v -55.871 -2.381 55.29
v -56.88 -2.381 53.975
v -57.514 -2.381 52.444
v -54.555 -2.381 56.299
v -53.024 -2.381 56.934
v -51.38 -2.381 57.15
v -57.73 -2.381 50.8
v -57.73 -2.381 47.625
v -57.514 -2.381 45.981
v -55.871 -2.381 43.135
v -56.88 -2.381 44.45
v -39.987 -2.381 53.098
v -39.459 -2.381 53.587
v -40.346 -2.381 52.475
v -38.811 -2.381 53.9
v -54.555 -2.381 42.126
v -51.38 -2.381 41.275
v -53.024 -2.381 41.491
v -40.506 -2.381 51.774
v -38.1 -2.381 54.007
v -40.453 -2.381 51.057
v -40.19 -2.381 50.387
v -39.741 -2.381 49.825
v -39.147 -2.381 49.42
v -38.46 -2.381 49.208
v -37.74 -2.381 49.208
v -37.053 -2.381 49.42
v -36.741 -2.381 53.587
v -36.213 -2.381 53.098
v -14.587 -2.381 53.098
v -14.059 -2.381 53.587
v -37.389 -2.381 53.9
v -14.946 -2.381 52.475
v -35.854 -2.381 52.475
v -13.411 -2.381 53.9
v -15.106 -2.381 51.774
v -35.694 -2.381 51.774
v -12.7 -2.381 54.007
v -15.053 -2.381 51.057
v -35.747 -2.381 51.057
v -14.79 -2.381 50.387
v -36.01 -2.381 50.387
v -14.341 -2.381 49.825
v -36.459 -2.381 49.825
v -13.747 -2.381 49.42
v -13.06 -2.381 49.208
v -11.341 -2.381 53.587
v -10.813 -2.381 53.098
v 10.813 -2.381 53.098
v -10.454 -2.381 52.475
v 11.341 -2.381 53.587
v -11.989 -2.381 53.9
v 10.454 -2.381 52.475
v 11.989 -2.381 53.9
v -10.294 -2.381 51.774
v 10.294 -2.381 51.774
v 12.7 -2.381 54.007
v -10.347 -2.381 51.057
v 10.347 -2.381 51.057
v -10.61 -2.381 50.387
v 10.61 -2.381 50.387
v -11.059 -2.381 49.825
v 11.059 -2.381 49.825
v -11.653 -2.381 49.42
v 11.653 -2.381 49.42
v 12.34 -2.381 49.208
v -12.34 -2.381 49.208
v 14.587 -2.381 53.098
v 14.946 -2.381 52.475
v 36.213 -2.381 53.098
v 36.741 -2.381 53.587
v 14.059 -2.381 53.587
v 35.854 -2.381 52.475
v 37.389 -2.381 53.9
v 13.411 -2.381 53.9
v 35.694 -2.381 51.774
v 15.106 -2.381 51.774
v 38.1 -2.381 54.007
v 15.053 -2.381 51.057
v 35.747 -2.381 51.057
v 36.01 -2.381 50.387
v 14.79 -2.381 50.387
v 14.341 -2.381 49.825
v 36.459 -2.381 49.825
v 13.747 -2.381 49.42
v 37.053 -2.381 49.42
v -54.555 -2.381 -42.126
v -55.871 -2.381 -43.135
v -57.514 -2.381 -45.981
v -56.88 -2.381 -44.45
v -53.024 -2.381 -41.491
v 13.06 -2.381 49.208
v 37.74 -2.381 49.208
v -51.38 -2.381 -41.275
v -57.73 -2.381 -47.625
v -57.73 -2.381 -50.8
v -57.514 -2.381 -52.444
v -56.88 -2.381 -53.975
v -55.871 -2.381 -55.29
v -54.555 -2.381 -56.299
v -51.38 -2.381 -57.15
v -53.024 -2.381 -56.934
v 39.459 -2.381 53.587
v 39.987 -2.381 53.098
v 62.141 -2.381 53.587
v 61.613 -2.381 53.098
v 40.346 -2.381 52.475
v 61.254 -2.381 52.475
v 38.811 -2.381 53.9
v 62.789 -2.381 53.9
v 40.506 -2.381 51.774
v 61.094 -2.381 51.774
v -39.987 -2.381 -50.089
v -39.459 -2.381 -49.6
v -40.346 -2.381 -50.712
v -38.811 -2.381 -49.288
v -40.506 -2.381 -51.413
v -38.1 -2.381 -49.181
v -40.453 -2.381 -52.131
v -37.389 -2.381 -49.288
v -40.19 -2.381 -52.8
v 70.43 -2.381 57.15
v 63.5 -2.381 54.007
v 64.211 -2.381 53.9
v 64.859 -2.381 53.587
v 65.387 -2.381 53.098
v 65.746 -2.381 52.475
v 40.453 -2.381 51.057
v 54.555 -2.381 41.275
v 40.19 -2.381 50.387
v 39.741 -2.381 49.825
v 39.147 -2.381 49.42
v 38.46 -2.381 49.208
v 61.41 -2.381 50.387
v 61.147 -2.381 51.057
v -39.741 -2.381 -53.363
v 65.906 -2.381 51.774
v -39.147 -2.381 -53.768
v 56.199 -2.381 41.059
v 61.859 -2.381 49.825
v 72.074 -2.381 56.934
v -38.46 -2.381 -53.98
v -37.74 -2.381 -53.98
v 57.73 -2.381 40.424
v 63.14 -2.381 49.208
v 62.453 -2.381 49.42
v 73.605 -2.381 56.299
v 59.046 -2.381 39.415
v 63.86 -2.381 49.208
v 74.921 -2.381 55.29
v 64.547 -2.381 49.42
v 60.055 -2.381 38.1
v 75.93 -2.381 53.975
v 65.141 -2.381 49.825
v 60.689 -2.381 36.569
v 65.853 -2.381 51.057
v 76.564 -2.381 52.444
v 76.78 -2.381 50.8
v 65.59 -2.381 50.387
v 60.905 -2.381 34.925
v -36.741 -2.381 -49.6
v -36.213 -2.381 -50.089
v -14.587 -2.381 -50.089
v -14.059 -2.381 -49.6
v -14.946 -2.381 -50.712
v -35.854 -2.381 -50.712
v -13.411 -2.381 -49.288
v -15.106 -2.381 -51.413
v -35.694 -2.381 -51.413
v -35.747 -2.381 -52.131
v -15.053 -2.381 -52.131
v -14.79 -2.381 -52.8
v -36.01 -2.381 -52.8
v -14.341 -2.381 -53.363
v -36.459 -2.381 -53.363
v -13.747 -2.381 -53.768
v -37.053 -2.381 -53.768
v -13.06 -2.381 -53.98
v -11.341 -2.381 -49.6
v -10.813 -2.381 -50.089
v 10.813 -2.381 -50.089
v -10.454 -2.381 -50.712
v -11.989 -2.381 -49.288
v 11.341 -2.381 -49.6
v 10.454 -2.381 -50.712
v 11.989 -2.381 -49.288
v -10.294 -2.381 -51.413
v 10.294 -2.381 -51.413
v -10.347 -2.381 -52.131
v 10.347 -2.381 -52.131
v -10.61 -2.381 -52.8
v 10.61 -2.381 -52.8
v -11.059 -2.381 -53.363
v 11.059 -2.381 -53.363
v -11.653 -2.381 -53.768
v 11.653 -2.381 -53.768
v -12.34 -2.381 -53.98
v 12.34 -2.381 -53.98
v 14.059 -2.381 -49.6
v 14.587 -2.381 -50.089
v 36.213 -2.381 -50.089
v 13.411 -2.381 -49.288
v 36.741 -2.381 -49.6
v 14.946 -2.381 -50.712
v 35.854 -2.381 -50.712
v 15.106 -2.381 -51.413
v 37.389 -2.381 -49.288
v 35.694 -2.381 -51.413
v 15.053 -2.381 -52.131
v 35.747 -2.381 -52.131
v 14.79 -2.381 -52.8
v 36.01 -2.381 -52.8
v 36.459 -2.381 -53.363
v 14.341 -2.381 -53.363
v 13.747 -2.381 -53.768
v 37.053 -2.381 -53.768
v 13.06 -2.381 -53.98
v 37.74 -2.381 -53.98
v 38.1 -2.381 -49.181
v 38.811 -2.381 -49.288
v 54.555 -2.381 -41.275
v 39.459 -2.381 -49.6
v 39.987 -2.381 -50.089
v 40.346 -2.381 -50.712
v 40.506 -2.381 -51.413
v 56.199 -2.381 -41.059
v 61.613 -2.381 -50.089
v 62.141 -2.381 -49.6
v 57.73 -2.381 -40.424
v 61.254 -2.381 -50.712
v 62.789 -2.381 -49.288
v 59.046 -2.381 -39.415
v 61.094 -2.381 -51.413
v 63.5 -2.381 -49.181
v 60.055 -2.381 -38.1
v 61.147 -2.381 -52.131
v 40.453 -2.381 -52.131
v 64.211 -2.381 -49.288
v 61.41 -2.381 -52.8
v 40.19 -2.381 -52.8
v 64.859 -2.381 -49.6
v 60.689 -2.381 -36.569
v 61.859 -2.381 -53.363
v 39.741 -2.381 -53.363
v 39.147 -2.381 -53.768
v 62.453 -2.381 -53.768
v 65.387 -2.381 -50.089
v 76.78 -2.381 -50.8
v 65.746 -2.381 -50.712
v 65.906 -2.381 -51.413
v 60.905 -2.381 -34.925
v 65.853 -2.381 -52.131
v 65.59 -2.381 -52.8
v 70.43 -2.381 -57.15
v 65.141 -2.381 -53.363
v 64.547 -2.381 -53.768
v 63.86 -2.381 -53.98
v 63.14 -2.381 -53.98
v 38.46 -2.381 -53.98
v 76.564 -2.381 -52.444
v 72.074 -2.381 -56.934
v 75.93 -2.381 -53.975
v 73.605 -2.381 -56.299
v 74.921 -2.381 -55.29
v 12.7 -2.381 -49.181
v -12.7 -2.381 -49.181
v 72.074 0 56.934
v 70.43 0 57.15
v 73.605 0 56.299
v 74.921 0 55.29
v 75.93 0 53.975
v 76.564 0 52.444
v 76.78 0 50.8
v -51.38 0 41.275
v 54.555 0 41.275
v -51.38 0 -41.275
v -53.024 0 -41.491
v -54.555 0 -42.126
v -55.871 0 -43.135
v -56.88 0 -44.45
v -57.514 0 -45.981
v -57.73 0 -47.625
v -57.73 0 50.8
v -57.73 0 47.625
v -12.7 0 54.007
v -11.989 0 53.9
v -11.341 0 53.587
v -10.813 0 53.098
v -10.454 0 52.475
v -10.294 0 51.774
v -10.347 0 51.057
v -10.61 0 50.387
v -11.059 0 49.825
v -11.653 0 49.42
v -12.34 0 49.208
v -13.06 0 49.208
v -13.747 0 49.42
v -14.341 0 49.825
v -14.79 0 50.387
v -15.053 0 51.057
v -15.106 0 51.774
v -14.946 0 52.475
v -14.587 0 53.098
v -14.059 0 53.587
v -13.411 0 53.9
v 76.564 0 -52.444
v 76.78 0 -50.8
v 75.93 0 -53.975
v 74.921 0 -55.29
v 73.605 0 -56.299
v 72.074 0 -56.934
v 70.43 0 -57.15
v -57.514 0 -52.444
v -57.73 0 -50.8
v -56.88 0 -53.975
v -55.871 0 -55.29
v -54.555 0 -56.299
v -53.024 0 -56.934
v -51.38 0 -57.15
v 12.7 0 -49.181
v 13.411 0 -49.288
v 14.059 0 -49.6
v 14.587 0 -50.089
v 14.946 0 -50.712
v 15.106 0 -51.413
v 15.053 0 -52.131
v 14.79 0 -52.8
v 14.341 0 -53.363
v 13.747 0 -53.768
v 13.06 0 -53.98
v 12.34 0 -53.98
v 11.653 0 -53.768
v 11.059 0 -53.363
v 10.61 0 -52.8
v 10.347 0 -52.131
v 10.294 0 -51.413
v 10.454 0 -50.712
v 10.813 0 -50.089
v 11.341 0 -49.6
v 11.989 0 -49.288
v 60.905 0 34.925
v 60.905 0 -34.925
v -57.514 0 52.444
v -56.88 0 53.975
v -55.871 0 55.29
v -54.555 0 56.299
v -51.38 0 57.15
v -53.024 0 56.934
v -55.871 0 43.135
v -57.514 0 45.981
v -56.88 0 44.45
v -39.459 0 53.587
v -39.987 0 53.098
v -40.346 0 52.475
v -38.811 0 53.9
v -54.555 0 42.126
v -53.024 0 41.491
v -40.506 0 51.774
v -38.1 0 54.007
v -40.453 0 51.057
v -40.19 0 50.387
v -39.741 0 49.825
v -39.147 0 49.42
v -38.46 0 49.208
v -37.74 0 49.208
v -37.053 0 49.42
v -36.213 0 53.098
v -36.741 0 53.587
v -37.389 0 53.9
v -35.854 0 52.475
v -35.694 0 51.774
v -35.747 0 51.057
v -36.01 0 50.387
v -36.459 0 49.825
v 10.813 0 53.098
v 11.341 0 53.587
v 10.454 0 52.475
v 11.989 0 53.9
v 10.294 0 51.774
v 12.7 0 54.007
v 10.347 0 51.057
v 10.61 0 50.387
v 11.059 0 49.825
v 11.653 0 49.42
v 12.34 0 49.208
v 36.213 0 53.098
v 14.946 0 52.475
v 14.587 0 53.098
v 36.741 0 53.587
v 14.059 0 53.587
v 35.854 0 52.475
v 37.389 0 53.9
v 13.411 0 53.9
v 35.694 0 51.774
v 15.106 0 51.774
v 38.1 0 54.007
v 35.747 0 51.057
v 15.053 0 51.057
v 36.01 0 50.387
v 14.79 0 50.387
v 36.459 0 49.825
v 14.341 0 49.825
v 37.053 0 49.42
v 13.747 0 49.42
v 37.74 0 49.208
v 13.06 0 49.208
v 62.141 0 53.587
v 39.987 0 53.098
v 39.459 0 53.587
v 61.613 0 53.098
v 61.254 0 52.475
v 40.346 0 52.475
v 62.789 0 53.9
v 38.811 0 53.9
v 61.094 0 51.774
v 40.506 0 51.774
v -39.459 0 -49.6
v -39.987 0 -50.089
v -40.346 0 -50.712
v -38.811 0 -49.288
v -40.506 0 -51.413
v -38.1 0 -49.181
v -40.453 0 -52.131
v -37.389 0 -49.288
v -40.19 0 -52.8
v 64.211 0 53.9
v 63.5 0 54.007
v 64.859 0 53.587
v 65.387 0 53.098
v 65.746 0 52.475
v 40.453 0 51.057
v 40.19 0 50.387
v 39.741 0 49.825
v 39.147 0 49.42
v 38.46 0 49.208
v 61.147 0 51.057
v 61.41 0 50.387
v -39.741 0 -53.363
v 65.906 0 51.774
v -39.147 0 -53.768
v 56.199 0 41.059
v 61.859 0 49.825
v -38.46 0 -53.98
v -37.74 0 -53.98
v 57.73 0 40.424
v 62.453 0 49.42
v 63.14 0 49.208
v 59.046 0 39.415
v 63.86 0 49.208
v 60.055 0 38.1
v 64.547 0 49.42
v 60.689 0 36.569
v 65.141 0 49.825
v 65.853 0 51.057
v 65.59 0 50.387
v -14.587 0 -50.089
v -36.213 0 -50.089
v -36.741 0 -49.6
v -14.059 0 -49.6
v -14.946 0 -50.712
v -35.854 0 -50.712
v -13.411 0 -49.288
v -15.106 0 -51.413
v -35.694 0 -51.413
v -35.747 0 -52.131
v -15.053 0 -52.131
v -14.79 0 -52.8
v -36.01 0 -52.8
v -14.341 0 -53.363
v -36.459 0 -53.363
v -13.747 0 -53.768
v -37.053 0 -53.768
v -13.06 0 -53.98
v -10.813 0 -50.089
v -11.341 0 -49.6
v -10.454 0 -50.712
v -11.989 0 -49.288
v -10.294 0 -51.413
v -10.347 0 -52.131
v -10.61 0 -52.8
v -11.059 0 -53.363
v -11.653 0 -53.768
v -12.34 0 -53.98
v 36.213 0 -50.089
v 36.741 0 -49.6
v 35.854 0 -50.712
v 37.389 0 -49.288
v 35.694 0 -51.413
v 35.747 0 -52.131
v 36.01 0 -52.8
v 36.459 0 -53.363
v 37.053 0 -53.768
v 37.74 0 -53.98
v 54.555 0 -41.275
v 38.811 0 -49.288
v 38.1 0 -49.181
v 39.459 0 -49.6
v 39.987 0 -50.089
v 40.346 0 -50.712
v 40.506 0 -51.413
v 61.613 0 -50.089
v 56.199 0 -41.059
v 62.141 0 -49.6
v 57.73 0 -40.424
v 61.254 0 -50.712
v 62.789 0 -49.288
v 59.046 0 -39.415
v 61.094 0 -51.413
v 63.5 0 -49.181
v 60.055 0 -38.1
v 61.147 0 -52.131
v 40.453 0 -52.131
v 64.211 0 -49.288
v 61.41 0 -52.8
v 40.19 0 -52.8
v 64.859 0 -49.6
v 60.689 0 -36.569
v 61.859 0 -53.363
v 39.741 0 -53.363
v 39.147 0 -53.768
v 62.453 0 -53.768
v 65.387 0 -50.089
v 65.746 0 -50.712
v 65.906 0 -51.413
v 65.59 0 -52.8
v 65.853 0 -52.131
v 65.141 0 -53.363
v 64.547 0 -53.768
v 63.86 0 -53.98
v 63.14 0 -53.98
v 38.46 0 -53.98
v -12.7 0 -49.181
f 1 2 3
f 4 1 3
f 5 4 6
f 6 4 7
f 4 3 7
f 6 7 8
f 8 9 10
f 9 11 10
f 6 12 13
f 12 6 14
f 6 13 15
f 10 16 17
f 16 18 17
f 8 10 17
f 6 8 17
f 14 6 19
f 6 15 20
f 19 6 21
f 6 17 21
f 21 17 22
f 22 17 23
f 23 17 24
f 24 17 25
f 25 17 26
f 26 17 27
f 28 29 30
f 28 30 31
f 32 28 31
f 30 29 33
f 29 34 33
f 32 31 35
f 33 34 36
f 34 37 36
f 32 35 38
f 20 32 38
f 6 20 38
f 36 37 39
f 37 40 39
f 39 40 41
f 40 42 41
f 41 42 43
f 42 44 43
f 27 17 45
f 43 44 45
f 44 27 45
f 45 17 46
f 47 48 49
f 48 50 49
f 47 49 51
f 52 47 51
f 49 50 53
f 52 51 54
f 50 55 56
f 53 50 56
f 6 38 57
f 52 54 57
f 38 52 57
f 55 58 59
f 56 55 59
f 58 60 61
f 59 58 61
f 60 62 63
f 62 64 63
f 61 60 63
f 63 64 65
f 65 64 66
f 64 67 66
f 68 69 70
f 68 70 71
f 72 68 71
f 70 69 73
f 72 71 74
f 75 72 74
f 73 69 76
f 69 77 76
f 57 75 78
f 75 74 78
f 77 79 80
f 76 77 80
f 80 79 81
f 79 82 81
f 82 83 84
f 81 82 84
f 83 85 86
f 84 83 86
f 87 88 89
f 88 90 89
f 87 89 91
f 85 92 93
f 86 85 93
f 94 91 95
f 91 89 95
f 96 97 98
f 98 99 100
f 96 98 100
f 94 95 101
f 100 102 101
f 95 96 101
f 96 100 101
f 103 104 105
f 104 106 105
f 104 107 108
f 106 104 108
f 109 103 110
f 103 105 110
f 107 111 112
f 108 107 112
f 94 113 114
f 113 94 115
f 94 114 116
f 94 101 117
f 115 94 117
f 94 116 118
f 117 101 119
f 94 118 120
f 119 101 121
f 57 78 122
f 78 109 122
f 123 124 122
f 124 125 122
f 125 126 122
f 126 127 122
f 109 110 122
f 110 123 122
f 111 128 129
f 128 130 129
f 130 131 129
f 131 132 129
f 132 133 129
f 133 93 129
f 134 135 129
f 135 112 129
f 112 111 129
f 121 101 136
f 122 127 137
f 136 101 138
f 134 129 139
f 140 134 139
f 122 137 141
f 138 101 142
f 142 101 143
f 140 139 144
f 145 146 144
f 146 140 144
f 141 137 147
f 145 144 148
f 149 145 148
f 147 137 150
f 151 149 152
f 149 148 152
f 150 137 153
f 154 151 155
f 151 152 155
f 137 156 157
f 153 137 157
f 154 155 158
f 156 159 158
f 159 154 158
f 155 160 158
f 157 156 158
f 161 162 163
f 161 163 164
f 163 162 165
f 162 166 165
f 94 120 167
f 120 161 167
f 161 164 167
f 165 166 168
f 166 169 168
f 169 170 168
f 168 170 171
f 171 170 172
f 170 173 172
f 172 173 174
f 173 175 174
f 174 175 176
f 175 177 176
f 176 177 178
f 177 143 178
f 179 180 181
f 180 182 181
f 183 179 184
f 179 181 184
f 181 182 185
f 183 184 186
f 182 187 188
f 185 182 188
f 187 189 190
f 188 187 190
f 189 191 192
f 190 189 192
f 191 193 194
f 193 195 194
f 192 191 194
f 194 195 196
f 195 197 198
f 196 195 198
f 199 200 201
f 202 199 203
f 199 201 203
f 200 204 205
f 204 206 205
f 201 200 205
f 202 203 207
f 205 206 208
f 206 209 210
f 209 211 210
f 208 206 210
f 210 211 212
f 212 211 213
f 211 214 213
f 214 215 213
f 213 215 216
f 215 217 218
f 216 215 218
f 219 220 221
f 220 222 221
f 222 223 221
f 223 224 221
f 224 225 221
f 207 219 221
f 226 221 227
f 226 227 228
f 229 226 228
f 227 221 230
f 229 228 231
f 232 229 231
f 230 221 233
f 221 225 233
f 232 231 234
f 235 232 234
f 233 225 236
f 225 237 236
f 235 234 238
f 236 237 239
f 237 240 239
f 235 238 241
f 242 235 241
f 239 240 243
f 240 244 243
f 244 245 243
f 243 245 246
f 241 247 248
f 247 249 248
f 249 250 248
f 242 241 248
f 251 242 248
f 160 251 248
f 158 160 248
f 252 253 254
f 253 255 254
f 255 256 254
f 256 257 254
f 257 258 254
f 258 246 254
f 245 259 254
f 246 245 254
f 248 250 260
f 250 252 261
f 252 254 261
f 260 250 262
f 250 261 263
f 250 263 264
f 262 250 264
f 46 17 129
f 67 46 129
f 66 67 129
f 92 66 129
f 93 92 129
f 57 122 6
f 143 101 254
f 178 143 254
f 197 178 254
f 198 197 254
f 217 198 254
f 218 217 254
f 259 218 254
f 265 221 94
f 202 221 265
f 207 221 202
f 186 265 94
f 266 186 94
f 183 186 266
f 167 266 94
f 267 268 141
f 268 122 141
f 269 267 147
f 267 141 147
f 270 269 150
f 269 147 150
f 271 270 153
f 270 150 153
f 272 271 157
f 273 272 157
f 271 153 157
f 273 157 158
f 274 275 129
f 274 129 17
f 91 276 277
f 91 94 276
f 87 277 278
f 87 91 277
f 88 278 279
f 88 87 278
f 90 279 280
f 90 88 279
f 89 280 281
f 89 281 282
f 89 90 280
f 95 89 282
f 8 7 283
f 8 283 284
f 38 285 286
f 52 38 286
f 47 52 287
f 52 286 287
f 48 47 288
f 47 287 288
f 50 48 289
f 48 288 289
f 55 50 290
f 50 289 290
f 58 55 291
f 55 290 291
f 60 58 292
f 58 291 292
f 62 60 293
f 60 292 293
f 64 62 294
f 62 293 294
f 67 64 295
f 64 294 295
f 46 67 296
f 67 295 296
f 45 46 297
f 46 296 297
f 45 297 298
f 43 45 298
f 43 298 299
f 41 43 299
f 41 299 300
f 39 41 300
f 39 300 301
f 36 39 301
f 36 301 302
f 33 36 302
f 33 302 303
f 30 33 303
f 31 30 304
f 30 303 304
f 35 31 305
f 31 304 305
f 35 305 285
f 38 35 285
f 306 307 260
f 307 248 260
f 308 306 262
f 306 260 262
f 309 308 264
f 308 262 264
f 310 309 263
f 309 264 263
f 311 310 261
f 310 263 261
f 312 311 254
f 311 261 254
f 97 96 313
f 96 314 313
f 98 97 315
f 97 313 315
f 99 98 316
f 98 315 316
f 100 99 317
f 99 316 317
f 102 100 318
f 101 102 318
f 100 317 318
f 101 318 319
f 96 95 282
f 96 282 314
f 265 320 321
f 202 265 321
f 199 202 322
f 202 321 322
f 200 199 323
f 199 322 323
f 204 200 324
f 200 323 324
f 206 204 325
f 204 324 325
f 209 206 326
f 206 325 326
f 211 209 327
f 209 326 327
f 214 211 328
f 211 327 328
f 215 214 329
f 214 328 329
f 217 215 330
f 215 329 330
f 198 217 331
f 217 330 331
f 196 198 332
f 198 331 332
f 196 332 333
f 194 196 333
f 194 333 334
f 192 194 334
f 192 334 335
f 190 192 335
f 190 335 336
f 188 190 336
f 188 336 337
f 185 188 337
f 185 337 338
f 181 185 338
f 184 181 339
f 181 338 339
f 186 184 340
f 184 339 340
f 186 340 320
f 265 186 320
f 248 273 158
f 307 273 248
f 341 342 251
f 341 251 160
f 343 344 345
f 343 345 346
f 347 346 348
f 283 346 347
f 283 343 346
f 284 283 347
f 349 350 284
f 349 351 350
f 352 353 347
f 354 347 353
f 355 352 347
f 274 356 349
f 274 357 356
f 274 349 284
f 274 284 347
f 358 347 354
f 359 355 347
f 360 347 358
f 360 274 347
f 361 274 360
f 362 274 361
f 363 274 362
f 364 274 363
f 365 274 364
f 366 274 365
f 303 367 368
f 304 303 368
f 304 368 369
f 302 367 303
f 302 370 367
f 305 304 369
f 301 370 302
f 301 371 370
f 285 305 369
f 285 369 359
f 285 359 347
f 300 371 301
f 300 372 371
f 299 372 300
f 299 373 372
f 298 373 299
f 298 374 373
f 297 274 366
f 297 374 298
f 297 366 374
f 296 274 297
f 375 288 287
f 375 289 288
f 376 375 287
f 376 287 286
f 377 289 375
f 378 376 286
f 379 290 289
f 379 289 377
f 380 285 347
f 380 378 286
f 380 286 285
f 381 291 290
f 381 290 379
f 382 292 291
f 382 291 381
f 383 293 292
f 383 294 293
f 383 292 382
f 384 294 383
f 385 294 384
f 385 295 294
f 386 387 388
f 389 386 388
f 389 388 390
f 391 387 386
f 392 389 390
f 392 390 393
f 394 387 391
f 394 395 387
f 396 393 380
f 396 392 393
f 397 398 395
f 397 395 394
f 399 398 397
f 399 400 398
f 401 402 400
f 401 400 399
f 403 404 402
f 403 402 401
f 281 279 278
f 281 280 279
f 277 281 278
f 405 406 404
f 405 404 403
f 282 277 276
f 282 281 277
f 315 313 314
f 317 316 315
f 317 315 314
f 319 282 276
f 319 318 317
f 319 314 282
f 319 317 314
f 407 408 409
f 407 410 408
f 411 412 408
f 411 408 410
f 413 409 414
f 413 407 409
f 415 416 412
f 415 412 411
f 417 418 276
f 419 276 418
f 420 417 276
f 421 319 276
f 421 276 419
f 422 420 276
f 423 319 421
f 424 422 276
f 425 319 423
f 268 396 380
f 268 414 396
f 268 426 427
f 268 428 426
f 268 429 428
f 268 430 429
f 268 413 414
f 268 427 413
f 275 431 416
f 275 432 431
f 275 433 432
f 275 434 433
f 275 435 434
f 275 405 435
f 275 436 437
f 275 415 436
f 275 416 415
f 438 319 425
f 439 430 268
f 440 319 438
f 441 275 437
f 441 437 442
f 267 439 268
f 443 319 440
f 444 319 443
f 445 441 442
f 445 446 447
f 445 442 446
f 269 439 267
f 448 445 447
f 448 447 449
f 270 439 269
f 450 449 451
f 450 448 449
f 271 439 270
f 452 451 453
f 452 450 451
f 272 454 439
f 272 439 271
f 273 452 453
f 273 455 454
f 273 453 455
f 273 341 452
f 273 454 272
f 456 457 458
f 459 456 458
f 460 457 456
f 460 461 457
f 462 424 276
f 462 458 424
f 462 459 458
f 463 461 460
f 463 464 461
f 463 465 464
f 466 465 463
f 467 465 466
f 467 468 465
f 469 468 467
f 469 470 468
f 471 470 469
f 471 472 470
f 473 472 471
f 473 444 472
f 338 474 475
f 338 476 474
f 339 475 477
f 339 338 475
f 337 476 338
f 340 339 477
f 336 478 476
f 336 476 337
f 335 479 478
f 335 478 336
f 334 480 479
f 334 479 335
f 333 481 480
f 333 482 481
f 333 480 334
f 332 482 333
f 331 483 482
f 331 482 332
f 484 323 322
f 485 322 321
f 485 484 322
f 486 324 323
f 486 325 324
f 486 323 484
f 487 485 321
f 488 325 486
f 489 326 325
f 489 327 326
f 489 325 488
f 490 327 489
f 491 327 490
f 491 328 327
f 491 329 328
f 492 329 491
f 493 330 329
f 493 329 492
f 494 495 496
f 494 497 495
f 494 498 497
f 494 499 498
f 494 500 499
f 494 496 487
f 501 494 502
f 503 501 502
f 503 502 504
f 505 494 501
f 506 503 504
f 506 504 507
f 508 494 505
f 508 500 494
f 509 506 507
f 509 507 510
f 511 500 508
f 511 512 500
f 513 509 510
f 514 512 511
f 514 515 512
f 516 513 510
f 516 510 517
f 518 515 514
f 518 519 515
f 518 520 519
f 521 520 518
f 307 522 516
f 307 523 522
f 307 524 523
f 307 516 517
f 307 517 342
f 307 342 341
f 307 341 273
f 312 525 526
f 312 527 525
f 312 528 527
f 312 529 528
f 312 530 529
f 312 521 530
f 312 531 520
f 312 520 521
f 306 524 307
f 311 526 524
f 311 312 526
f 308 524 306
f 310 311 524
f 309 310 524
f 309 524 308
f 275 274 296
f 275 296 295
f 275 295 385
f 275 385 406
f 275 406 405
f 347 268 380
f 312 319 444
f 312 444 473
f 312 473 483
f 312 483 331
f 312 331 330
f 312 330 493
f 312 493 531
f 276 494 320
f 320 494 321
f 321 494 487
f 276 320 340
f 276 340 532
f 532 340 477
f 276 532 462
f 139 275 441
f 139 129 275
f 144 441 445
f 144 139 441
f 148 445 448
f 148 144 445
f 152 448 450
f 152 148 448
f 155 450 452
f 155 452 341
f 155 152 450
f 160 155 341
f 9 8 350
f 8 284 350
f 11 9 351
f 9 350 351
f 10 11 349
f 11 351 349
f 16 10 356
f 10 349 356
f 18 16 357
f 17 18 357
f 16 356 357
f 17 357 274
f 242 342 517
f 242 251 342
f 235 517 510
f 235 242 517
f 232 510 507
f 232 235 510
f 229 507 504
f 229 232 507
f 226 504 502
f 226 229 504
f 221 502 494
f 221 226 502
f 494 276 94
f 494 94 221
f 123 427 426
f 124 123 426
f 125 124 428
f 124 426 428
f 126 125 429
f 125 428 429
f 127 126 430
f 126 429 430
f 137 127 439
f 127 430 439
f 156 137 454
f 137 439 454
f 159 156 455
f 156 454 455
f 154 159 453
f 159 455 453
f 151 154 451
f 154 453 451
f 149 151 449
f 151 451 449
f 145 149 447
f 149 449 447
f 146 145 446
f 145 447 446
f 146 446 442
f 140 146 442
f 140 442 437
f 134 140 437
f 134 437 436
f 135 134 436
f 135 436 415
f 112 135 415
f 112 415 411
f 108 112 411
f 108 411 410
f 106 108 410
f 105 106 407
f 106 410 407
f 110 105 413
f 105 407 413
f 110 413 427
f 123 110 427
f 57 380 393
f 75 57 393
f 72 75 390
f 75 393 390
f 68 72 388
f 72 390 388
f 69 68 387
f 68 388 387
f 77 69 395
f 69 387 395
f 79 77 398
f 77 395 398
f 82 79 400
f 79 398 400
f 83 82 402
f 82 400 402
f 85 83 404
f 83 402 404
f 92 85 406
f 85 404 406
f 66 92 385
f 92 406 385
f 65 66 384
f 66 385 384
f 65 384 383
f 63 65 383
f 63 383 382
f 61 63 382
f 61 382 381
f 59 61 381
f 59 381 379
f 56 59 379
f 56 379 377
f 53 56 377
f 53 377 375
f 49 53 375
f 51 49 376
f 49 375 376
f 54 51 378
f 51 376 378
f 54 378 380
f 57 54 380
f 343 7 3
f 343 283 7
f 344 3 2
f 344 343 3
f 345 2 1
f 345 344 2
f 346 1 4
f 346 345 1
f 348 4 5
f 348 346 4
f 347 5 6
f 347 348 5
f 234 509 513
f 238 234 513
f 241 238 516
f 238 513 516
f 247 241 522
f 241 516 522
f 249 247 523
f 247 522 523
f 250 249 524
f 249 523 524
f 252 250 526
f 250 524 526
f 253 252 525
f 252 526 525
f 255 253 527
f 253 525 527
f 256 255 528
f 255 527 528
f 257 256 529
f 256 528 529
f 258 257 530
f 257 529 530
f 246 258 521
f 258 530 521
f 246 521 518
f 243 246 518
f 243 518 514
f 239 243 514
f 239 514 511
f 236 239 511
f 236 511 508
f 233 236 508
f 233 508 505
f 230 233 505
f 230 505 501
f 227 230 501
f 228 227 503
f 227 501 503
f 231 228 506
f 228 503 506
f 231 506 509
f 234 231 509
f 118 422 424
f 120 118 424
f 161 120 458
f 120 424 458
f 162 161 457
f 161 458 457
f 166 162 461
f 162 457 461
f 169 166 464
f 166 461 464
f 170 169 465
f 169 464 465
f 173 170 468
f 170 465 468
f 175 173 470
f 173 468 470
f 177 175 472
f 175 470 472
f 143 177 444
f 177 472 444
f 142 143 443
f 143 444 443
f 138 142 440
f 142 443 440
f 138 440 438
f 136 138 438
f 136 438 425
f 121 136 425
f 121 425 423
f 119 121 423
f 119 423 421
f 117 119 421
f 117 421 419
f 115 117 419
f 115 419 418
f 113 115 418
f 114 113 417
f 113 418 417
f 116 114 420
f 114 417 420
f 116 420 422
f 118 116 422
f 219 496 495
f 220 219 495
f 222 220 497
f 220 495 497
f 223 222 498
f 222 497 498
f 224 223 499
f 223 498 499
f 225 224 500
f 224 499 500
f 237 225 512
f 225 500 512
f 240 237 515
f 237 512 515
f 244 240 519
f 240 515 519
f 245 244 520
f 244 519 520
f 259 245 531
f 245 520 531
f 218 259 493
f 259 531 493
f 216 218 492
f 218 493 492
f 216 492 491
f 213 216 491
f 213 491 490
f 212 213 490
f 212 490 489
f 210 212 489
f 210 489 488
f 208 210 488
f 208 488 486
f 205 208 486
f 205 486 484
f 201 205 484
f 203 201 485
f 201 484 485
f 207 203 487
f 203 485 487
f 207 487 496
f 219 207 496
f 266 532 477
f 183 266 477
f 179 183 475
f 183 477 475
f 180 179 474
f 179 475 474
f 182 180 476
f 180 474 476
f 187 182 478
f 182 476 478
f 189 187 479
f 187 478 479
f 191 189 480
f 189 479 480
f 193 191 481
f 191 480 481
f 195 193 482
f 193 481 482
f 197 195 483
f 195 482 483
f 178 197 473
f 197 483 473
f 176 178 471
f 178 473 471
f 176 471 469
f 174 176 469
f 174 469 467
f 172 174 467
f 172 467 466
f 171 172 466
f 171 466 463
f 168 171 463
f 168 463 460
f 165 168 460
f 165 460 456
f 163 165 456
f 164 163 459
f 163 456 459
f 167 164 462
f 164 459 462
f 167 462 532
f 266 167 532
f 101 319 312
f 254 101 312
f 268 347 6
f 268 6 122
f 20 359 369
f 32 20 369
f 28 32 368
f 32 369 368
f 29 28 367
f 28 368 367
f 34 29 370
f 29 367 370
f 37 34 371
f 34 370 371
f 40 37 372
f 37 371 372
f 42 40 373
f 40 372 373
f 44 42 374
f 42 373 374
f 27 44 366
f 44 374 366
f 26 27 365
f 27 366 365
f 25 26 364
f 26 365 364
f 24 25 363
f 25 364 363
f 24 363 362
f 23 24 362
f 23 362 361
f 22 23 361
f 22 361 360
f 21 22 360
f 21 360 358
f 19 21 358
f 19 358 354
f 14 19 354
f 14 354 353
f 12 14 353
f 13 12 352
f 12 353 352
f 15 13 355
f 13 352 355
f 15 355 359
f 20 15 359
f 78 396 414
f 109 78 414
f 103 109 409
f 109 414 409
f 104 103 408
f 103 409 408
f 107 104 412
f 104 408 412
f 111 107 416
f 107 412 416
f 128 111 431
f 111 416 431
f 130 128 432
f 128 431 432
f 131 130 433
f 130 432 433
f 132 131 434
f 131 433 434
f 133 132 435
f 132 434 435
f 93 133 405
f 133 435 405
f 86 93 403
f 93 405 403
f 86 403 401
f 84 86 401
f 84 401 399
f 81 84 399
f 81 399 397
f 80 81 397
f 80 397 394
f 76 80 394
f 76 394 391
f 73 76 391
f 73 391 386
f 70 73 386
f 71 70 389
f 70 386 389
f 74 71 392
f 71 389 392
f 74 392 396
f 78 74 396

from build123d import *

# Parameters (mm, degrees)
SKETCH1_W          = 153.56078
SKETCH1_H          = 114.3
SKETCH1_R          = 2.413
BASE_FLANGE1_DEPTH = 2.38125
FILLET1_R          = 6.35
SKETCH7_W          = 19.05
SKETCH7_H          = 114.3
CUT_EXTRUDE2_DEPTH = 2.54
FILLET2_R          = 6.35
FILLET3_R          = 6.35


# Sheet-metal steps are written as plain solids
with BuildPart() as part:
    # Sketch1 → Base-Flange1 (new body)
    with BuildSketch(Plane(origin=(0, 0, 0), x_dir=(1, 0, 0), z_dir=(0, 1, 0))):
        Rectangle(SKETCH1_W, SKETCH1_H)
        with Locations(Location((-63.5, -51.59375, 0), (0, 0, 270))):
            Circle(SKETCH1_R, mode=Mode.SUBTRACT)
        with Locations(Location((-38.1, -51.59375, 0), (0, 0, 270))):
            Circle(SKETCH1_R, mode=Mode.SUBTRACT)
        with Locations(Location((-12.7, -51.59375, 0), (0, 0, 270))):
            Circle(SKETCH1_R, mode=Mode.SUBTRACT)
        with Locations(Location((12.7, -51.59375, 0), (0, 0, 270))):
            Circle(SKETCH1_R, mode=Mode.SUBTRACT)
        with Locations(Location((38.1, -51.59375, 0), (0, 0, 270))):
            Circle(SKETCH1_R, mode=Mode.SUBTRACT)
        with Locations(Location((63.5, -51.59375, 0), (0, 0, 270))):
            Circle(SKETCH1_R, mode=Mode.SUBTRACT)
        with Locations(Location((63.5, 51.59375, 0), (0, 0, 270))):
            Circle(SKETCH1_R, mode=Mode.SUBTRACT)
        with Locations(Location((38.1, 51.59375, 0), (0, 0, 270))):
            Circle(SKETCH1_R, mode=Mode.SUBTRACT)
        with Locations(Location((12.7, 51.59375, 0), (0, 0, 270))):
            Circle(SKETCH1_R, mode=Mode.SUBTRACT)
        with Locations(Location((-12.7, 51.59375, 0), (0, 0, 270))):
            Circle(SKETCH1_R, mode=Mode.SUBTRACT)
        with Locations(Location((-38.1, 51.59375, 0), (0, 0, 270))):
            Circle(SKETCH1_R, mode=Mode.SUBTRACT)
        with Locations(Location((-63.5, 51.59375, 0), (0, 0, 270))):
            Circle(SKETCH1_R, mode=Mode.SUBTRACT)
        Polygon((60.90539, -41.275), (-63.104482091, -41.275), (-63.104482091, 41.275), (21.327886111, 41.275), (60.90539, 41.275), (60.90539, 15.875), align=None, mode=Mode.SUBTRACT)
    extrude(amount=-BASE_FLANGE1_DEPTH)

    # Fillet1
    fillet1_edges = [part.edges().sort_by_distance(p)[0] for p in [
        (-76.78039, -1.190625, -57.15),
        (76.78039, -1.190625, -57.15),
        (76.78039, -1.190625, 57.15),
        (-76.78039, -1.190625, 57.15),
    ]]
    fillet(fillet1_edges, radius=FILLET1_R)

    # Sketch7 → Cut-Extrude2 (cut)
    with BuildSketch(Plane(origin=(0, -2.38125, 0), x_dir=(-1, 0, 0), z_dir=(0, -1, 0))):
        with Locations((67.25539, 0)):
            Rectangle(SKETCH7_W, SKETCH7_H)
    extrude(amount=-CUT_EXTRUDE2_DEPTH, mode=Mode.SUBTRACT)

    # Fillet2
    fillet2_edges = [part.edges().sort_by_distance(p)[0] for p in [
        (-57.73039, -1.190625, 41.275),
        (-57.73039, -1.190625, -41.275),
        (-57.73039, -1.190625, 57.15),
        (-57.73039, -1.190625, -57.15),
    ]]
    fillet(fillet2_edges, radius=FILLET2_R)

    # Fillet3
    fillet3_edges = [part.edges().sort_by_distance(p)[0] for p in [
        (60.90539, -1.190625, -41.275),
        (60.90539, -1.190625, 41.275),
    ]]
    fillet(fillet3_edges, radius=FILLET3_R)


solid = part.part
